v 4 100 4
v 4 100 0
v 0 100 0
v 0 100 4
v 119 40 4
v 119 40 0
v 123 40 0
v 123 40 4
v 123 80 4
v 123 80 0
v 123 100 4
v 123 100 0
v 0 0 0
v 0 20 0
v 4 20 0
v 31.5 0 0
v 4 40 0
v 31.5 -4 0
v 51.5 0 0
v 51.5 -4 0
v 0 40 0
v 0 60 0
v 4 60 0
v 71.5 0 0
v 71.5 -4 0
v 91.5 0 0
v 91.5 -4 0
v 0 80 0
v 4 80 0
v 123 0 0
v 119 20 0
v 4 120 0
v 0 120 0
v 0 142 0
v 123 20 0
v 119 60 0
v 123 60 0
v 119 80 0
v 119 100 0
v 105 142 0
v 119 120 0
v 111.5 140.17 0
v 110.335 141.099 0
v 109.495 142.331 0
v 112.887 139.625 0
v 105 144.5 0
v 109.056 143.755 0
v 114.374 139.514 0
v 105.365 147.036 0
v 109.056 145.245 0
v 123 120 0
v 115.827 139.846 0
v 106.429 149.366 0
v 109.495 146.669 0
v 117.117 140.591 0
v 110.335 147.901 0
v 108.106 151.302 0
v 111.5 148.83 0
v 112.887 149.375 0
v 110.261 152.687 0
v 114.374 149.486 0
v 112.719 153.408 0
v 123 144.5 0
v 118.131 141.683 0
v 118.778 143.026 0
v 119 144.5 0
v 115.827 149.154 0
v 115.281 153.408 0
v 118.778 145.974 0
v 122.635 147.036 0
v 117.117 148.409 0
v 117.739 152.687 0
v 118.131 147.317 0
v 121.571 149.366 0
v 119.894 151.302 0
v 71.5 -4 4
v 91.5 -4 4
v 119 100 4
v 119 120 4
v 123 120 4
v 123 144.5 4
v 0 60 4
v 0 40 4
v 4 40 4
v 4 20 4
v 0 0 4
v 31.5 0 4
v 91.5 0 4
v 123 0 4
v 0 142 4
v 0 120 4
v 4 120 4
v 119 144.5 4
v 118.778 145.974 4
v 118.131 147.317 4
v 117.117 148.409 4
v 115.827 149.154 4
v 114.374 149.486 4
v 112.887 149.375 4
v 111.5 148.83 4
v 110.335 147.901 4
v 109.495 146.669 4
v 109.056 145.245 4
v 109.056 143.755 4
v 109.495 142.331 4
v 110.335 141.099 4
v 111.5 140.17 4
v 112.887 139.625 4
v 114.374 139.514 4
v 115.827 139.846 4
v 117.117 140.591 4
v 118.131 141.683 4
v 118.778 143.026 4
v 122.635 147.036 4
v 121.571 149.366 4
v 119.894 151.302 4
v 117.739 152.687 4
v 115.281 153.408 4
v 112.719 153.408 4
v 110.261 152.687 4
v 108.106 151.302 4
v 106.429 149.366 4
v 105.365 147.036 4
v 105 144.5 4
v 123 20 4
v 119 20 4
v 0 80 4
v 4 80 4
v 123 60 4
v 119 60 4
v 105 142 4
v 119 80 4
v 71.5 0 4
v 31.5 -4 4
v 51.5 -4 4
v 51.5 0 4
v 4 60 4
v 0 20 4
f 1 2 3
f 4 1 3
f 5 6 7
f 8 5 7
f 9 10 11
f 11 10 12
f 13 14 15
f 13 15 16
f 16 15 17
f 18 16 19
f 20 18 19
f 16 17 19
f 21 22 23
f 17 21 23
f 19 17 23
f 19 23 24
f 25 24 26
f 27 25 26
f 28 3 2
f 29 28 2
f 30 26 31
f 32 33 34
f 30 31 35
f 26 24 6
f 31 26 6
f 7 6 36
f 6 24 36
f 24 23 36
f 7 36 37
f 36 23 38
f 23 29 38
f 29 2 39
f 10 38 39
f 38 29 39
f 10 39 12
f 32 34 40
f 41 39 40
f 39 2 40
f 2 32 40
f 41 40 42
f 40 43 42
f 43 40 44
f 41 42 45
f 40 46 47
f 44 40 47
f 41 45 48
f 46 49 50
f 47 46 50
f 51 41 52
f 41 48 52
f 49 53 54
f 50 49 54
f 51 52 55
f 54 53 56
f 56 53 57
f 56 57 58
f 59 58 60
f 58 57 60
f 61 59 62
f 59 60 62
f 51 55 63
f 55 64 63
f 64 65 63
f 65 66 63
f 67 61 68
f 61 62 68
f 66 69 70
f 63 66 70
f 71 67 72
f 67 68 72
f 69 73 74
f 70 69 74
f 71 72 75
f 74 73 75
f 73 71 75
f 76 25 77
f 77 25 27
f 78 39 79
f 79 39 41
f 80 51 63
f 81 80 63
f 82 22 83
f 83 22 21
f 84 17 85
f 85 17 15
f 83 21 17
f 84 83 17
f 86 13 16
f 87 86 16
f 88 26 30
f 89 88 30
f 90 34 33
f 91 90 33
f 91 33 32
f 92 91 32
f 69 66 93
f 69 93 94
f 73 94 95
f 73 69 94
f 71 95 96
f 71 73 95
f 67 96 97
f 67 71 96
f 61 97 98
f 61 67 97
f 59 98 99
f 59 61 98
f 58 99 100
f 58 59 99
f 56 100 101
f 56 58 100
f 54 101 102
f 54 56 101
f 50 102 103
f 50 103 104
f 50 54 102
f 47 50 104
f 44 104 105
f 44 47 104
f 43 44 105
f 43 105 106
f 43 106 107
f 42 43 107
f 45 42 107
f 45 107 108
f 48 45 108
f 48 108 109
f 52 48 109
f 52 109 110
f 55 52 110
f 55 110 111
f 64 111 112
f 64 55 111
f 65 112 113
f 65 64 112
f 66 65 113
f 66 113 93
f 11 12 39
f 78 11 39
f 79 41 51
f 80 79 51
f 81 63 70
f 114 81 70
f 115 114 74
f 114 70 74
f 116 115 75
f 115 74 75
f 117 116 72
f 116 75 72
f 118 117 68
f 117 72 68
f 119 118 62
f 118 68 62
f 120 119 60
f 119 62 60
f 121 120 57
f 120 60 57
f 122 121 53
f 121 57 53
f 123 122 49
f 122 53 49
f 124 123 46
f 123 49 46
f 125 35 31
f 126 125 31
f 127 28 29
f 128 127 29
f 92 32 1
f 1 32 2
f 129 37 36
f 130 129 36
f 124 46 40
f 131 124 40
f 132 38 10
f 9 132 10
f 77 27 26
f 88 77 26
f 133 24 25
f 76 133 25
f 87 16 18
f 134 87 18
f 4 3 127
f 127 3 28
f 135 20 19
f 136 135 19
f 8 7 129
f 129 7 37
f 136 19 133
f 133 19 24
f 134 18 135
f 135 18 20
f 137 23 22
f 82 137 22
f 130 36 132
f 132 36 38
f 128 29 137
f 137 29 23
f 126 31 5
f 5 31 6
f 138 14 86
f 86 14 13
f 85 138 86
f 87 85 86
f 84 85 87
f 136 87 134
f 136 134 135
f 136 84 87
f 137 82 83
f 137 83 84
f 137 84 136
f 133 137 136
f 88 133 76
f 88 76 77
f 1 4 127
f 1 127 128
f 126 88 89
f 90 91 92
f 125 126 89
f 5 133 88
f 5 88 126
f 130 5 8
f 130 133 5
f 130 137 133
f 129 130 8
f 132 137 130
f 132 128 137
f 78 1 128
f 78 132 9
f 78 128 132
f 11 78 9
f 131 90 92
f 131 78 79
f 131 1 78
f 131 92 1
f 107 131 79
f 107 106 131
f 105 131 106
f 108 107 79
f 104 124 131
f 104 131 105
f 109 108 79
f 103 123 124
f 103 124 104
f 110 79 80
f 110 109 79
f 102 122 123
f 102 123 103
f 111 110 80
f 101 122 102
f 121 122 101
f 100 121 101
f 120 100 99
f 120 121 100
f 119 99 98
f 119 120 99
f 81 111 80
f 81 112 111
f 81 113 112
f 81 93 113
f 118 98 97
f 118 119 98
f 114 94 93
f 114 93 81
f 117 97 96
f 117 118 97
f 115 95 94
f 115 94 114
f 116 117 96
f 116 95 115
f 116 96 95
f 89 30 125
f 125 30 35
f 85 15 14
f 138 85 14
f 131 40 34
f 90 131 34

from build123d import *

# Parameters (mm, degrees)
SKETCH_1_R      = 5
EXTRUDE_1_DEPTH = 4


with BuildPart() as part:
    # Эскиз1 → Бобышка-Вытянуть1 (new body)
    with BuildSketch(Plane.XY):
        with BuildLine():
            Line((31.5, 0), (31.5, -4))
            Line((31.5, -4), (51.5, -4))
            Line((51.5, -4), (51.5, 0))
            Line((51.5, 0), (71.5, 0))
            Line((71.5, 0), (71.5, -4))
            Line((71.5, -4), (91.5, -4))
            Line((91.5, -4), (91.5, 0))
            Line((91.5, 0), (123, 0))
            Line((123, 0), (123, 20))
            Line((123, 20), (119, 20))
            Line((119, 20), (119, 40))
            Line((119, 40), (123, 40))
            Line((123, 40), (123, 60))
            Line((123, 60), (119, 60))
            Line((119, 60), (119, 80))
            Line((119, 80), (123, 80))
            Line((123, 80), (123, 100))
            Line((123, 100), (119, 100))
            Line((119, 100), (119, 120))
            Line((119, 120), (123, 120))
            Line((123, 120), (123, 144.5))
            ThreePointArc((123, 144.5), (114, 153.5), (105, 144.5))
            Line((105, 144.5), (105, 142))
            Line((105, 142), (0, 142))
            Line((0, 142), (0, 120))
            Line((0, 120), (4, 120))
            Line((4, 120), (4, 100))
            Line((4, 100), (0, 100))
            Line((0, 100), (0, 80))
            Line((0, 80), (4, 80))
            Line((4, 80), (4, 60))
            Line((4, 60), (0, 60))
            Line((0, 60), (0, 40))
            Line((0, 40), (4, 40))
            Line((4, 40), (4, 20))
            Line((4, 20), (0, 20))
            Line((0, 20), (0, 0))
            Line((0, 0), (31.5, 0))
        make_face()
        with Locations((114, 144.5)):
            Circle(SKETCH_1_R, mode=Mode.SUBTRACT)
    extrude(amount=EXTRUDE_1_DEPTH)


solid = part.part
